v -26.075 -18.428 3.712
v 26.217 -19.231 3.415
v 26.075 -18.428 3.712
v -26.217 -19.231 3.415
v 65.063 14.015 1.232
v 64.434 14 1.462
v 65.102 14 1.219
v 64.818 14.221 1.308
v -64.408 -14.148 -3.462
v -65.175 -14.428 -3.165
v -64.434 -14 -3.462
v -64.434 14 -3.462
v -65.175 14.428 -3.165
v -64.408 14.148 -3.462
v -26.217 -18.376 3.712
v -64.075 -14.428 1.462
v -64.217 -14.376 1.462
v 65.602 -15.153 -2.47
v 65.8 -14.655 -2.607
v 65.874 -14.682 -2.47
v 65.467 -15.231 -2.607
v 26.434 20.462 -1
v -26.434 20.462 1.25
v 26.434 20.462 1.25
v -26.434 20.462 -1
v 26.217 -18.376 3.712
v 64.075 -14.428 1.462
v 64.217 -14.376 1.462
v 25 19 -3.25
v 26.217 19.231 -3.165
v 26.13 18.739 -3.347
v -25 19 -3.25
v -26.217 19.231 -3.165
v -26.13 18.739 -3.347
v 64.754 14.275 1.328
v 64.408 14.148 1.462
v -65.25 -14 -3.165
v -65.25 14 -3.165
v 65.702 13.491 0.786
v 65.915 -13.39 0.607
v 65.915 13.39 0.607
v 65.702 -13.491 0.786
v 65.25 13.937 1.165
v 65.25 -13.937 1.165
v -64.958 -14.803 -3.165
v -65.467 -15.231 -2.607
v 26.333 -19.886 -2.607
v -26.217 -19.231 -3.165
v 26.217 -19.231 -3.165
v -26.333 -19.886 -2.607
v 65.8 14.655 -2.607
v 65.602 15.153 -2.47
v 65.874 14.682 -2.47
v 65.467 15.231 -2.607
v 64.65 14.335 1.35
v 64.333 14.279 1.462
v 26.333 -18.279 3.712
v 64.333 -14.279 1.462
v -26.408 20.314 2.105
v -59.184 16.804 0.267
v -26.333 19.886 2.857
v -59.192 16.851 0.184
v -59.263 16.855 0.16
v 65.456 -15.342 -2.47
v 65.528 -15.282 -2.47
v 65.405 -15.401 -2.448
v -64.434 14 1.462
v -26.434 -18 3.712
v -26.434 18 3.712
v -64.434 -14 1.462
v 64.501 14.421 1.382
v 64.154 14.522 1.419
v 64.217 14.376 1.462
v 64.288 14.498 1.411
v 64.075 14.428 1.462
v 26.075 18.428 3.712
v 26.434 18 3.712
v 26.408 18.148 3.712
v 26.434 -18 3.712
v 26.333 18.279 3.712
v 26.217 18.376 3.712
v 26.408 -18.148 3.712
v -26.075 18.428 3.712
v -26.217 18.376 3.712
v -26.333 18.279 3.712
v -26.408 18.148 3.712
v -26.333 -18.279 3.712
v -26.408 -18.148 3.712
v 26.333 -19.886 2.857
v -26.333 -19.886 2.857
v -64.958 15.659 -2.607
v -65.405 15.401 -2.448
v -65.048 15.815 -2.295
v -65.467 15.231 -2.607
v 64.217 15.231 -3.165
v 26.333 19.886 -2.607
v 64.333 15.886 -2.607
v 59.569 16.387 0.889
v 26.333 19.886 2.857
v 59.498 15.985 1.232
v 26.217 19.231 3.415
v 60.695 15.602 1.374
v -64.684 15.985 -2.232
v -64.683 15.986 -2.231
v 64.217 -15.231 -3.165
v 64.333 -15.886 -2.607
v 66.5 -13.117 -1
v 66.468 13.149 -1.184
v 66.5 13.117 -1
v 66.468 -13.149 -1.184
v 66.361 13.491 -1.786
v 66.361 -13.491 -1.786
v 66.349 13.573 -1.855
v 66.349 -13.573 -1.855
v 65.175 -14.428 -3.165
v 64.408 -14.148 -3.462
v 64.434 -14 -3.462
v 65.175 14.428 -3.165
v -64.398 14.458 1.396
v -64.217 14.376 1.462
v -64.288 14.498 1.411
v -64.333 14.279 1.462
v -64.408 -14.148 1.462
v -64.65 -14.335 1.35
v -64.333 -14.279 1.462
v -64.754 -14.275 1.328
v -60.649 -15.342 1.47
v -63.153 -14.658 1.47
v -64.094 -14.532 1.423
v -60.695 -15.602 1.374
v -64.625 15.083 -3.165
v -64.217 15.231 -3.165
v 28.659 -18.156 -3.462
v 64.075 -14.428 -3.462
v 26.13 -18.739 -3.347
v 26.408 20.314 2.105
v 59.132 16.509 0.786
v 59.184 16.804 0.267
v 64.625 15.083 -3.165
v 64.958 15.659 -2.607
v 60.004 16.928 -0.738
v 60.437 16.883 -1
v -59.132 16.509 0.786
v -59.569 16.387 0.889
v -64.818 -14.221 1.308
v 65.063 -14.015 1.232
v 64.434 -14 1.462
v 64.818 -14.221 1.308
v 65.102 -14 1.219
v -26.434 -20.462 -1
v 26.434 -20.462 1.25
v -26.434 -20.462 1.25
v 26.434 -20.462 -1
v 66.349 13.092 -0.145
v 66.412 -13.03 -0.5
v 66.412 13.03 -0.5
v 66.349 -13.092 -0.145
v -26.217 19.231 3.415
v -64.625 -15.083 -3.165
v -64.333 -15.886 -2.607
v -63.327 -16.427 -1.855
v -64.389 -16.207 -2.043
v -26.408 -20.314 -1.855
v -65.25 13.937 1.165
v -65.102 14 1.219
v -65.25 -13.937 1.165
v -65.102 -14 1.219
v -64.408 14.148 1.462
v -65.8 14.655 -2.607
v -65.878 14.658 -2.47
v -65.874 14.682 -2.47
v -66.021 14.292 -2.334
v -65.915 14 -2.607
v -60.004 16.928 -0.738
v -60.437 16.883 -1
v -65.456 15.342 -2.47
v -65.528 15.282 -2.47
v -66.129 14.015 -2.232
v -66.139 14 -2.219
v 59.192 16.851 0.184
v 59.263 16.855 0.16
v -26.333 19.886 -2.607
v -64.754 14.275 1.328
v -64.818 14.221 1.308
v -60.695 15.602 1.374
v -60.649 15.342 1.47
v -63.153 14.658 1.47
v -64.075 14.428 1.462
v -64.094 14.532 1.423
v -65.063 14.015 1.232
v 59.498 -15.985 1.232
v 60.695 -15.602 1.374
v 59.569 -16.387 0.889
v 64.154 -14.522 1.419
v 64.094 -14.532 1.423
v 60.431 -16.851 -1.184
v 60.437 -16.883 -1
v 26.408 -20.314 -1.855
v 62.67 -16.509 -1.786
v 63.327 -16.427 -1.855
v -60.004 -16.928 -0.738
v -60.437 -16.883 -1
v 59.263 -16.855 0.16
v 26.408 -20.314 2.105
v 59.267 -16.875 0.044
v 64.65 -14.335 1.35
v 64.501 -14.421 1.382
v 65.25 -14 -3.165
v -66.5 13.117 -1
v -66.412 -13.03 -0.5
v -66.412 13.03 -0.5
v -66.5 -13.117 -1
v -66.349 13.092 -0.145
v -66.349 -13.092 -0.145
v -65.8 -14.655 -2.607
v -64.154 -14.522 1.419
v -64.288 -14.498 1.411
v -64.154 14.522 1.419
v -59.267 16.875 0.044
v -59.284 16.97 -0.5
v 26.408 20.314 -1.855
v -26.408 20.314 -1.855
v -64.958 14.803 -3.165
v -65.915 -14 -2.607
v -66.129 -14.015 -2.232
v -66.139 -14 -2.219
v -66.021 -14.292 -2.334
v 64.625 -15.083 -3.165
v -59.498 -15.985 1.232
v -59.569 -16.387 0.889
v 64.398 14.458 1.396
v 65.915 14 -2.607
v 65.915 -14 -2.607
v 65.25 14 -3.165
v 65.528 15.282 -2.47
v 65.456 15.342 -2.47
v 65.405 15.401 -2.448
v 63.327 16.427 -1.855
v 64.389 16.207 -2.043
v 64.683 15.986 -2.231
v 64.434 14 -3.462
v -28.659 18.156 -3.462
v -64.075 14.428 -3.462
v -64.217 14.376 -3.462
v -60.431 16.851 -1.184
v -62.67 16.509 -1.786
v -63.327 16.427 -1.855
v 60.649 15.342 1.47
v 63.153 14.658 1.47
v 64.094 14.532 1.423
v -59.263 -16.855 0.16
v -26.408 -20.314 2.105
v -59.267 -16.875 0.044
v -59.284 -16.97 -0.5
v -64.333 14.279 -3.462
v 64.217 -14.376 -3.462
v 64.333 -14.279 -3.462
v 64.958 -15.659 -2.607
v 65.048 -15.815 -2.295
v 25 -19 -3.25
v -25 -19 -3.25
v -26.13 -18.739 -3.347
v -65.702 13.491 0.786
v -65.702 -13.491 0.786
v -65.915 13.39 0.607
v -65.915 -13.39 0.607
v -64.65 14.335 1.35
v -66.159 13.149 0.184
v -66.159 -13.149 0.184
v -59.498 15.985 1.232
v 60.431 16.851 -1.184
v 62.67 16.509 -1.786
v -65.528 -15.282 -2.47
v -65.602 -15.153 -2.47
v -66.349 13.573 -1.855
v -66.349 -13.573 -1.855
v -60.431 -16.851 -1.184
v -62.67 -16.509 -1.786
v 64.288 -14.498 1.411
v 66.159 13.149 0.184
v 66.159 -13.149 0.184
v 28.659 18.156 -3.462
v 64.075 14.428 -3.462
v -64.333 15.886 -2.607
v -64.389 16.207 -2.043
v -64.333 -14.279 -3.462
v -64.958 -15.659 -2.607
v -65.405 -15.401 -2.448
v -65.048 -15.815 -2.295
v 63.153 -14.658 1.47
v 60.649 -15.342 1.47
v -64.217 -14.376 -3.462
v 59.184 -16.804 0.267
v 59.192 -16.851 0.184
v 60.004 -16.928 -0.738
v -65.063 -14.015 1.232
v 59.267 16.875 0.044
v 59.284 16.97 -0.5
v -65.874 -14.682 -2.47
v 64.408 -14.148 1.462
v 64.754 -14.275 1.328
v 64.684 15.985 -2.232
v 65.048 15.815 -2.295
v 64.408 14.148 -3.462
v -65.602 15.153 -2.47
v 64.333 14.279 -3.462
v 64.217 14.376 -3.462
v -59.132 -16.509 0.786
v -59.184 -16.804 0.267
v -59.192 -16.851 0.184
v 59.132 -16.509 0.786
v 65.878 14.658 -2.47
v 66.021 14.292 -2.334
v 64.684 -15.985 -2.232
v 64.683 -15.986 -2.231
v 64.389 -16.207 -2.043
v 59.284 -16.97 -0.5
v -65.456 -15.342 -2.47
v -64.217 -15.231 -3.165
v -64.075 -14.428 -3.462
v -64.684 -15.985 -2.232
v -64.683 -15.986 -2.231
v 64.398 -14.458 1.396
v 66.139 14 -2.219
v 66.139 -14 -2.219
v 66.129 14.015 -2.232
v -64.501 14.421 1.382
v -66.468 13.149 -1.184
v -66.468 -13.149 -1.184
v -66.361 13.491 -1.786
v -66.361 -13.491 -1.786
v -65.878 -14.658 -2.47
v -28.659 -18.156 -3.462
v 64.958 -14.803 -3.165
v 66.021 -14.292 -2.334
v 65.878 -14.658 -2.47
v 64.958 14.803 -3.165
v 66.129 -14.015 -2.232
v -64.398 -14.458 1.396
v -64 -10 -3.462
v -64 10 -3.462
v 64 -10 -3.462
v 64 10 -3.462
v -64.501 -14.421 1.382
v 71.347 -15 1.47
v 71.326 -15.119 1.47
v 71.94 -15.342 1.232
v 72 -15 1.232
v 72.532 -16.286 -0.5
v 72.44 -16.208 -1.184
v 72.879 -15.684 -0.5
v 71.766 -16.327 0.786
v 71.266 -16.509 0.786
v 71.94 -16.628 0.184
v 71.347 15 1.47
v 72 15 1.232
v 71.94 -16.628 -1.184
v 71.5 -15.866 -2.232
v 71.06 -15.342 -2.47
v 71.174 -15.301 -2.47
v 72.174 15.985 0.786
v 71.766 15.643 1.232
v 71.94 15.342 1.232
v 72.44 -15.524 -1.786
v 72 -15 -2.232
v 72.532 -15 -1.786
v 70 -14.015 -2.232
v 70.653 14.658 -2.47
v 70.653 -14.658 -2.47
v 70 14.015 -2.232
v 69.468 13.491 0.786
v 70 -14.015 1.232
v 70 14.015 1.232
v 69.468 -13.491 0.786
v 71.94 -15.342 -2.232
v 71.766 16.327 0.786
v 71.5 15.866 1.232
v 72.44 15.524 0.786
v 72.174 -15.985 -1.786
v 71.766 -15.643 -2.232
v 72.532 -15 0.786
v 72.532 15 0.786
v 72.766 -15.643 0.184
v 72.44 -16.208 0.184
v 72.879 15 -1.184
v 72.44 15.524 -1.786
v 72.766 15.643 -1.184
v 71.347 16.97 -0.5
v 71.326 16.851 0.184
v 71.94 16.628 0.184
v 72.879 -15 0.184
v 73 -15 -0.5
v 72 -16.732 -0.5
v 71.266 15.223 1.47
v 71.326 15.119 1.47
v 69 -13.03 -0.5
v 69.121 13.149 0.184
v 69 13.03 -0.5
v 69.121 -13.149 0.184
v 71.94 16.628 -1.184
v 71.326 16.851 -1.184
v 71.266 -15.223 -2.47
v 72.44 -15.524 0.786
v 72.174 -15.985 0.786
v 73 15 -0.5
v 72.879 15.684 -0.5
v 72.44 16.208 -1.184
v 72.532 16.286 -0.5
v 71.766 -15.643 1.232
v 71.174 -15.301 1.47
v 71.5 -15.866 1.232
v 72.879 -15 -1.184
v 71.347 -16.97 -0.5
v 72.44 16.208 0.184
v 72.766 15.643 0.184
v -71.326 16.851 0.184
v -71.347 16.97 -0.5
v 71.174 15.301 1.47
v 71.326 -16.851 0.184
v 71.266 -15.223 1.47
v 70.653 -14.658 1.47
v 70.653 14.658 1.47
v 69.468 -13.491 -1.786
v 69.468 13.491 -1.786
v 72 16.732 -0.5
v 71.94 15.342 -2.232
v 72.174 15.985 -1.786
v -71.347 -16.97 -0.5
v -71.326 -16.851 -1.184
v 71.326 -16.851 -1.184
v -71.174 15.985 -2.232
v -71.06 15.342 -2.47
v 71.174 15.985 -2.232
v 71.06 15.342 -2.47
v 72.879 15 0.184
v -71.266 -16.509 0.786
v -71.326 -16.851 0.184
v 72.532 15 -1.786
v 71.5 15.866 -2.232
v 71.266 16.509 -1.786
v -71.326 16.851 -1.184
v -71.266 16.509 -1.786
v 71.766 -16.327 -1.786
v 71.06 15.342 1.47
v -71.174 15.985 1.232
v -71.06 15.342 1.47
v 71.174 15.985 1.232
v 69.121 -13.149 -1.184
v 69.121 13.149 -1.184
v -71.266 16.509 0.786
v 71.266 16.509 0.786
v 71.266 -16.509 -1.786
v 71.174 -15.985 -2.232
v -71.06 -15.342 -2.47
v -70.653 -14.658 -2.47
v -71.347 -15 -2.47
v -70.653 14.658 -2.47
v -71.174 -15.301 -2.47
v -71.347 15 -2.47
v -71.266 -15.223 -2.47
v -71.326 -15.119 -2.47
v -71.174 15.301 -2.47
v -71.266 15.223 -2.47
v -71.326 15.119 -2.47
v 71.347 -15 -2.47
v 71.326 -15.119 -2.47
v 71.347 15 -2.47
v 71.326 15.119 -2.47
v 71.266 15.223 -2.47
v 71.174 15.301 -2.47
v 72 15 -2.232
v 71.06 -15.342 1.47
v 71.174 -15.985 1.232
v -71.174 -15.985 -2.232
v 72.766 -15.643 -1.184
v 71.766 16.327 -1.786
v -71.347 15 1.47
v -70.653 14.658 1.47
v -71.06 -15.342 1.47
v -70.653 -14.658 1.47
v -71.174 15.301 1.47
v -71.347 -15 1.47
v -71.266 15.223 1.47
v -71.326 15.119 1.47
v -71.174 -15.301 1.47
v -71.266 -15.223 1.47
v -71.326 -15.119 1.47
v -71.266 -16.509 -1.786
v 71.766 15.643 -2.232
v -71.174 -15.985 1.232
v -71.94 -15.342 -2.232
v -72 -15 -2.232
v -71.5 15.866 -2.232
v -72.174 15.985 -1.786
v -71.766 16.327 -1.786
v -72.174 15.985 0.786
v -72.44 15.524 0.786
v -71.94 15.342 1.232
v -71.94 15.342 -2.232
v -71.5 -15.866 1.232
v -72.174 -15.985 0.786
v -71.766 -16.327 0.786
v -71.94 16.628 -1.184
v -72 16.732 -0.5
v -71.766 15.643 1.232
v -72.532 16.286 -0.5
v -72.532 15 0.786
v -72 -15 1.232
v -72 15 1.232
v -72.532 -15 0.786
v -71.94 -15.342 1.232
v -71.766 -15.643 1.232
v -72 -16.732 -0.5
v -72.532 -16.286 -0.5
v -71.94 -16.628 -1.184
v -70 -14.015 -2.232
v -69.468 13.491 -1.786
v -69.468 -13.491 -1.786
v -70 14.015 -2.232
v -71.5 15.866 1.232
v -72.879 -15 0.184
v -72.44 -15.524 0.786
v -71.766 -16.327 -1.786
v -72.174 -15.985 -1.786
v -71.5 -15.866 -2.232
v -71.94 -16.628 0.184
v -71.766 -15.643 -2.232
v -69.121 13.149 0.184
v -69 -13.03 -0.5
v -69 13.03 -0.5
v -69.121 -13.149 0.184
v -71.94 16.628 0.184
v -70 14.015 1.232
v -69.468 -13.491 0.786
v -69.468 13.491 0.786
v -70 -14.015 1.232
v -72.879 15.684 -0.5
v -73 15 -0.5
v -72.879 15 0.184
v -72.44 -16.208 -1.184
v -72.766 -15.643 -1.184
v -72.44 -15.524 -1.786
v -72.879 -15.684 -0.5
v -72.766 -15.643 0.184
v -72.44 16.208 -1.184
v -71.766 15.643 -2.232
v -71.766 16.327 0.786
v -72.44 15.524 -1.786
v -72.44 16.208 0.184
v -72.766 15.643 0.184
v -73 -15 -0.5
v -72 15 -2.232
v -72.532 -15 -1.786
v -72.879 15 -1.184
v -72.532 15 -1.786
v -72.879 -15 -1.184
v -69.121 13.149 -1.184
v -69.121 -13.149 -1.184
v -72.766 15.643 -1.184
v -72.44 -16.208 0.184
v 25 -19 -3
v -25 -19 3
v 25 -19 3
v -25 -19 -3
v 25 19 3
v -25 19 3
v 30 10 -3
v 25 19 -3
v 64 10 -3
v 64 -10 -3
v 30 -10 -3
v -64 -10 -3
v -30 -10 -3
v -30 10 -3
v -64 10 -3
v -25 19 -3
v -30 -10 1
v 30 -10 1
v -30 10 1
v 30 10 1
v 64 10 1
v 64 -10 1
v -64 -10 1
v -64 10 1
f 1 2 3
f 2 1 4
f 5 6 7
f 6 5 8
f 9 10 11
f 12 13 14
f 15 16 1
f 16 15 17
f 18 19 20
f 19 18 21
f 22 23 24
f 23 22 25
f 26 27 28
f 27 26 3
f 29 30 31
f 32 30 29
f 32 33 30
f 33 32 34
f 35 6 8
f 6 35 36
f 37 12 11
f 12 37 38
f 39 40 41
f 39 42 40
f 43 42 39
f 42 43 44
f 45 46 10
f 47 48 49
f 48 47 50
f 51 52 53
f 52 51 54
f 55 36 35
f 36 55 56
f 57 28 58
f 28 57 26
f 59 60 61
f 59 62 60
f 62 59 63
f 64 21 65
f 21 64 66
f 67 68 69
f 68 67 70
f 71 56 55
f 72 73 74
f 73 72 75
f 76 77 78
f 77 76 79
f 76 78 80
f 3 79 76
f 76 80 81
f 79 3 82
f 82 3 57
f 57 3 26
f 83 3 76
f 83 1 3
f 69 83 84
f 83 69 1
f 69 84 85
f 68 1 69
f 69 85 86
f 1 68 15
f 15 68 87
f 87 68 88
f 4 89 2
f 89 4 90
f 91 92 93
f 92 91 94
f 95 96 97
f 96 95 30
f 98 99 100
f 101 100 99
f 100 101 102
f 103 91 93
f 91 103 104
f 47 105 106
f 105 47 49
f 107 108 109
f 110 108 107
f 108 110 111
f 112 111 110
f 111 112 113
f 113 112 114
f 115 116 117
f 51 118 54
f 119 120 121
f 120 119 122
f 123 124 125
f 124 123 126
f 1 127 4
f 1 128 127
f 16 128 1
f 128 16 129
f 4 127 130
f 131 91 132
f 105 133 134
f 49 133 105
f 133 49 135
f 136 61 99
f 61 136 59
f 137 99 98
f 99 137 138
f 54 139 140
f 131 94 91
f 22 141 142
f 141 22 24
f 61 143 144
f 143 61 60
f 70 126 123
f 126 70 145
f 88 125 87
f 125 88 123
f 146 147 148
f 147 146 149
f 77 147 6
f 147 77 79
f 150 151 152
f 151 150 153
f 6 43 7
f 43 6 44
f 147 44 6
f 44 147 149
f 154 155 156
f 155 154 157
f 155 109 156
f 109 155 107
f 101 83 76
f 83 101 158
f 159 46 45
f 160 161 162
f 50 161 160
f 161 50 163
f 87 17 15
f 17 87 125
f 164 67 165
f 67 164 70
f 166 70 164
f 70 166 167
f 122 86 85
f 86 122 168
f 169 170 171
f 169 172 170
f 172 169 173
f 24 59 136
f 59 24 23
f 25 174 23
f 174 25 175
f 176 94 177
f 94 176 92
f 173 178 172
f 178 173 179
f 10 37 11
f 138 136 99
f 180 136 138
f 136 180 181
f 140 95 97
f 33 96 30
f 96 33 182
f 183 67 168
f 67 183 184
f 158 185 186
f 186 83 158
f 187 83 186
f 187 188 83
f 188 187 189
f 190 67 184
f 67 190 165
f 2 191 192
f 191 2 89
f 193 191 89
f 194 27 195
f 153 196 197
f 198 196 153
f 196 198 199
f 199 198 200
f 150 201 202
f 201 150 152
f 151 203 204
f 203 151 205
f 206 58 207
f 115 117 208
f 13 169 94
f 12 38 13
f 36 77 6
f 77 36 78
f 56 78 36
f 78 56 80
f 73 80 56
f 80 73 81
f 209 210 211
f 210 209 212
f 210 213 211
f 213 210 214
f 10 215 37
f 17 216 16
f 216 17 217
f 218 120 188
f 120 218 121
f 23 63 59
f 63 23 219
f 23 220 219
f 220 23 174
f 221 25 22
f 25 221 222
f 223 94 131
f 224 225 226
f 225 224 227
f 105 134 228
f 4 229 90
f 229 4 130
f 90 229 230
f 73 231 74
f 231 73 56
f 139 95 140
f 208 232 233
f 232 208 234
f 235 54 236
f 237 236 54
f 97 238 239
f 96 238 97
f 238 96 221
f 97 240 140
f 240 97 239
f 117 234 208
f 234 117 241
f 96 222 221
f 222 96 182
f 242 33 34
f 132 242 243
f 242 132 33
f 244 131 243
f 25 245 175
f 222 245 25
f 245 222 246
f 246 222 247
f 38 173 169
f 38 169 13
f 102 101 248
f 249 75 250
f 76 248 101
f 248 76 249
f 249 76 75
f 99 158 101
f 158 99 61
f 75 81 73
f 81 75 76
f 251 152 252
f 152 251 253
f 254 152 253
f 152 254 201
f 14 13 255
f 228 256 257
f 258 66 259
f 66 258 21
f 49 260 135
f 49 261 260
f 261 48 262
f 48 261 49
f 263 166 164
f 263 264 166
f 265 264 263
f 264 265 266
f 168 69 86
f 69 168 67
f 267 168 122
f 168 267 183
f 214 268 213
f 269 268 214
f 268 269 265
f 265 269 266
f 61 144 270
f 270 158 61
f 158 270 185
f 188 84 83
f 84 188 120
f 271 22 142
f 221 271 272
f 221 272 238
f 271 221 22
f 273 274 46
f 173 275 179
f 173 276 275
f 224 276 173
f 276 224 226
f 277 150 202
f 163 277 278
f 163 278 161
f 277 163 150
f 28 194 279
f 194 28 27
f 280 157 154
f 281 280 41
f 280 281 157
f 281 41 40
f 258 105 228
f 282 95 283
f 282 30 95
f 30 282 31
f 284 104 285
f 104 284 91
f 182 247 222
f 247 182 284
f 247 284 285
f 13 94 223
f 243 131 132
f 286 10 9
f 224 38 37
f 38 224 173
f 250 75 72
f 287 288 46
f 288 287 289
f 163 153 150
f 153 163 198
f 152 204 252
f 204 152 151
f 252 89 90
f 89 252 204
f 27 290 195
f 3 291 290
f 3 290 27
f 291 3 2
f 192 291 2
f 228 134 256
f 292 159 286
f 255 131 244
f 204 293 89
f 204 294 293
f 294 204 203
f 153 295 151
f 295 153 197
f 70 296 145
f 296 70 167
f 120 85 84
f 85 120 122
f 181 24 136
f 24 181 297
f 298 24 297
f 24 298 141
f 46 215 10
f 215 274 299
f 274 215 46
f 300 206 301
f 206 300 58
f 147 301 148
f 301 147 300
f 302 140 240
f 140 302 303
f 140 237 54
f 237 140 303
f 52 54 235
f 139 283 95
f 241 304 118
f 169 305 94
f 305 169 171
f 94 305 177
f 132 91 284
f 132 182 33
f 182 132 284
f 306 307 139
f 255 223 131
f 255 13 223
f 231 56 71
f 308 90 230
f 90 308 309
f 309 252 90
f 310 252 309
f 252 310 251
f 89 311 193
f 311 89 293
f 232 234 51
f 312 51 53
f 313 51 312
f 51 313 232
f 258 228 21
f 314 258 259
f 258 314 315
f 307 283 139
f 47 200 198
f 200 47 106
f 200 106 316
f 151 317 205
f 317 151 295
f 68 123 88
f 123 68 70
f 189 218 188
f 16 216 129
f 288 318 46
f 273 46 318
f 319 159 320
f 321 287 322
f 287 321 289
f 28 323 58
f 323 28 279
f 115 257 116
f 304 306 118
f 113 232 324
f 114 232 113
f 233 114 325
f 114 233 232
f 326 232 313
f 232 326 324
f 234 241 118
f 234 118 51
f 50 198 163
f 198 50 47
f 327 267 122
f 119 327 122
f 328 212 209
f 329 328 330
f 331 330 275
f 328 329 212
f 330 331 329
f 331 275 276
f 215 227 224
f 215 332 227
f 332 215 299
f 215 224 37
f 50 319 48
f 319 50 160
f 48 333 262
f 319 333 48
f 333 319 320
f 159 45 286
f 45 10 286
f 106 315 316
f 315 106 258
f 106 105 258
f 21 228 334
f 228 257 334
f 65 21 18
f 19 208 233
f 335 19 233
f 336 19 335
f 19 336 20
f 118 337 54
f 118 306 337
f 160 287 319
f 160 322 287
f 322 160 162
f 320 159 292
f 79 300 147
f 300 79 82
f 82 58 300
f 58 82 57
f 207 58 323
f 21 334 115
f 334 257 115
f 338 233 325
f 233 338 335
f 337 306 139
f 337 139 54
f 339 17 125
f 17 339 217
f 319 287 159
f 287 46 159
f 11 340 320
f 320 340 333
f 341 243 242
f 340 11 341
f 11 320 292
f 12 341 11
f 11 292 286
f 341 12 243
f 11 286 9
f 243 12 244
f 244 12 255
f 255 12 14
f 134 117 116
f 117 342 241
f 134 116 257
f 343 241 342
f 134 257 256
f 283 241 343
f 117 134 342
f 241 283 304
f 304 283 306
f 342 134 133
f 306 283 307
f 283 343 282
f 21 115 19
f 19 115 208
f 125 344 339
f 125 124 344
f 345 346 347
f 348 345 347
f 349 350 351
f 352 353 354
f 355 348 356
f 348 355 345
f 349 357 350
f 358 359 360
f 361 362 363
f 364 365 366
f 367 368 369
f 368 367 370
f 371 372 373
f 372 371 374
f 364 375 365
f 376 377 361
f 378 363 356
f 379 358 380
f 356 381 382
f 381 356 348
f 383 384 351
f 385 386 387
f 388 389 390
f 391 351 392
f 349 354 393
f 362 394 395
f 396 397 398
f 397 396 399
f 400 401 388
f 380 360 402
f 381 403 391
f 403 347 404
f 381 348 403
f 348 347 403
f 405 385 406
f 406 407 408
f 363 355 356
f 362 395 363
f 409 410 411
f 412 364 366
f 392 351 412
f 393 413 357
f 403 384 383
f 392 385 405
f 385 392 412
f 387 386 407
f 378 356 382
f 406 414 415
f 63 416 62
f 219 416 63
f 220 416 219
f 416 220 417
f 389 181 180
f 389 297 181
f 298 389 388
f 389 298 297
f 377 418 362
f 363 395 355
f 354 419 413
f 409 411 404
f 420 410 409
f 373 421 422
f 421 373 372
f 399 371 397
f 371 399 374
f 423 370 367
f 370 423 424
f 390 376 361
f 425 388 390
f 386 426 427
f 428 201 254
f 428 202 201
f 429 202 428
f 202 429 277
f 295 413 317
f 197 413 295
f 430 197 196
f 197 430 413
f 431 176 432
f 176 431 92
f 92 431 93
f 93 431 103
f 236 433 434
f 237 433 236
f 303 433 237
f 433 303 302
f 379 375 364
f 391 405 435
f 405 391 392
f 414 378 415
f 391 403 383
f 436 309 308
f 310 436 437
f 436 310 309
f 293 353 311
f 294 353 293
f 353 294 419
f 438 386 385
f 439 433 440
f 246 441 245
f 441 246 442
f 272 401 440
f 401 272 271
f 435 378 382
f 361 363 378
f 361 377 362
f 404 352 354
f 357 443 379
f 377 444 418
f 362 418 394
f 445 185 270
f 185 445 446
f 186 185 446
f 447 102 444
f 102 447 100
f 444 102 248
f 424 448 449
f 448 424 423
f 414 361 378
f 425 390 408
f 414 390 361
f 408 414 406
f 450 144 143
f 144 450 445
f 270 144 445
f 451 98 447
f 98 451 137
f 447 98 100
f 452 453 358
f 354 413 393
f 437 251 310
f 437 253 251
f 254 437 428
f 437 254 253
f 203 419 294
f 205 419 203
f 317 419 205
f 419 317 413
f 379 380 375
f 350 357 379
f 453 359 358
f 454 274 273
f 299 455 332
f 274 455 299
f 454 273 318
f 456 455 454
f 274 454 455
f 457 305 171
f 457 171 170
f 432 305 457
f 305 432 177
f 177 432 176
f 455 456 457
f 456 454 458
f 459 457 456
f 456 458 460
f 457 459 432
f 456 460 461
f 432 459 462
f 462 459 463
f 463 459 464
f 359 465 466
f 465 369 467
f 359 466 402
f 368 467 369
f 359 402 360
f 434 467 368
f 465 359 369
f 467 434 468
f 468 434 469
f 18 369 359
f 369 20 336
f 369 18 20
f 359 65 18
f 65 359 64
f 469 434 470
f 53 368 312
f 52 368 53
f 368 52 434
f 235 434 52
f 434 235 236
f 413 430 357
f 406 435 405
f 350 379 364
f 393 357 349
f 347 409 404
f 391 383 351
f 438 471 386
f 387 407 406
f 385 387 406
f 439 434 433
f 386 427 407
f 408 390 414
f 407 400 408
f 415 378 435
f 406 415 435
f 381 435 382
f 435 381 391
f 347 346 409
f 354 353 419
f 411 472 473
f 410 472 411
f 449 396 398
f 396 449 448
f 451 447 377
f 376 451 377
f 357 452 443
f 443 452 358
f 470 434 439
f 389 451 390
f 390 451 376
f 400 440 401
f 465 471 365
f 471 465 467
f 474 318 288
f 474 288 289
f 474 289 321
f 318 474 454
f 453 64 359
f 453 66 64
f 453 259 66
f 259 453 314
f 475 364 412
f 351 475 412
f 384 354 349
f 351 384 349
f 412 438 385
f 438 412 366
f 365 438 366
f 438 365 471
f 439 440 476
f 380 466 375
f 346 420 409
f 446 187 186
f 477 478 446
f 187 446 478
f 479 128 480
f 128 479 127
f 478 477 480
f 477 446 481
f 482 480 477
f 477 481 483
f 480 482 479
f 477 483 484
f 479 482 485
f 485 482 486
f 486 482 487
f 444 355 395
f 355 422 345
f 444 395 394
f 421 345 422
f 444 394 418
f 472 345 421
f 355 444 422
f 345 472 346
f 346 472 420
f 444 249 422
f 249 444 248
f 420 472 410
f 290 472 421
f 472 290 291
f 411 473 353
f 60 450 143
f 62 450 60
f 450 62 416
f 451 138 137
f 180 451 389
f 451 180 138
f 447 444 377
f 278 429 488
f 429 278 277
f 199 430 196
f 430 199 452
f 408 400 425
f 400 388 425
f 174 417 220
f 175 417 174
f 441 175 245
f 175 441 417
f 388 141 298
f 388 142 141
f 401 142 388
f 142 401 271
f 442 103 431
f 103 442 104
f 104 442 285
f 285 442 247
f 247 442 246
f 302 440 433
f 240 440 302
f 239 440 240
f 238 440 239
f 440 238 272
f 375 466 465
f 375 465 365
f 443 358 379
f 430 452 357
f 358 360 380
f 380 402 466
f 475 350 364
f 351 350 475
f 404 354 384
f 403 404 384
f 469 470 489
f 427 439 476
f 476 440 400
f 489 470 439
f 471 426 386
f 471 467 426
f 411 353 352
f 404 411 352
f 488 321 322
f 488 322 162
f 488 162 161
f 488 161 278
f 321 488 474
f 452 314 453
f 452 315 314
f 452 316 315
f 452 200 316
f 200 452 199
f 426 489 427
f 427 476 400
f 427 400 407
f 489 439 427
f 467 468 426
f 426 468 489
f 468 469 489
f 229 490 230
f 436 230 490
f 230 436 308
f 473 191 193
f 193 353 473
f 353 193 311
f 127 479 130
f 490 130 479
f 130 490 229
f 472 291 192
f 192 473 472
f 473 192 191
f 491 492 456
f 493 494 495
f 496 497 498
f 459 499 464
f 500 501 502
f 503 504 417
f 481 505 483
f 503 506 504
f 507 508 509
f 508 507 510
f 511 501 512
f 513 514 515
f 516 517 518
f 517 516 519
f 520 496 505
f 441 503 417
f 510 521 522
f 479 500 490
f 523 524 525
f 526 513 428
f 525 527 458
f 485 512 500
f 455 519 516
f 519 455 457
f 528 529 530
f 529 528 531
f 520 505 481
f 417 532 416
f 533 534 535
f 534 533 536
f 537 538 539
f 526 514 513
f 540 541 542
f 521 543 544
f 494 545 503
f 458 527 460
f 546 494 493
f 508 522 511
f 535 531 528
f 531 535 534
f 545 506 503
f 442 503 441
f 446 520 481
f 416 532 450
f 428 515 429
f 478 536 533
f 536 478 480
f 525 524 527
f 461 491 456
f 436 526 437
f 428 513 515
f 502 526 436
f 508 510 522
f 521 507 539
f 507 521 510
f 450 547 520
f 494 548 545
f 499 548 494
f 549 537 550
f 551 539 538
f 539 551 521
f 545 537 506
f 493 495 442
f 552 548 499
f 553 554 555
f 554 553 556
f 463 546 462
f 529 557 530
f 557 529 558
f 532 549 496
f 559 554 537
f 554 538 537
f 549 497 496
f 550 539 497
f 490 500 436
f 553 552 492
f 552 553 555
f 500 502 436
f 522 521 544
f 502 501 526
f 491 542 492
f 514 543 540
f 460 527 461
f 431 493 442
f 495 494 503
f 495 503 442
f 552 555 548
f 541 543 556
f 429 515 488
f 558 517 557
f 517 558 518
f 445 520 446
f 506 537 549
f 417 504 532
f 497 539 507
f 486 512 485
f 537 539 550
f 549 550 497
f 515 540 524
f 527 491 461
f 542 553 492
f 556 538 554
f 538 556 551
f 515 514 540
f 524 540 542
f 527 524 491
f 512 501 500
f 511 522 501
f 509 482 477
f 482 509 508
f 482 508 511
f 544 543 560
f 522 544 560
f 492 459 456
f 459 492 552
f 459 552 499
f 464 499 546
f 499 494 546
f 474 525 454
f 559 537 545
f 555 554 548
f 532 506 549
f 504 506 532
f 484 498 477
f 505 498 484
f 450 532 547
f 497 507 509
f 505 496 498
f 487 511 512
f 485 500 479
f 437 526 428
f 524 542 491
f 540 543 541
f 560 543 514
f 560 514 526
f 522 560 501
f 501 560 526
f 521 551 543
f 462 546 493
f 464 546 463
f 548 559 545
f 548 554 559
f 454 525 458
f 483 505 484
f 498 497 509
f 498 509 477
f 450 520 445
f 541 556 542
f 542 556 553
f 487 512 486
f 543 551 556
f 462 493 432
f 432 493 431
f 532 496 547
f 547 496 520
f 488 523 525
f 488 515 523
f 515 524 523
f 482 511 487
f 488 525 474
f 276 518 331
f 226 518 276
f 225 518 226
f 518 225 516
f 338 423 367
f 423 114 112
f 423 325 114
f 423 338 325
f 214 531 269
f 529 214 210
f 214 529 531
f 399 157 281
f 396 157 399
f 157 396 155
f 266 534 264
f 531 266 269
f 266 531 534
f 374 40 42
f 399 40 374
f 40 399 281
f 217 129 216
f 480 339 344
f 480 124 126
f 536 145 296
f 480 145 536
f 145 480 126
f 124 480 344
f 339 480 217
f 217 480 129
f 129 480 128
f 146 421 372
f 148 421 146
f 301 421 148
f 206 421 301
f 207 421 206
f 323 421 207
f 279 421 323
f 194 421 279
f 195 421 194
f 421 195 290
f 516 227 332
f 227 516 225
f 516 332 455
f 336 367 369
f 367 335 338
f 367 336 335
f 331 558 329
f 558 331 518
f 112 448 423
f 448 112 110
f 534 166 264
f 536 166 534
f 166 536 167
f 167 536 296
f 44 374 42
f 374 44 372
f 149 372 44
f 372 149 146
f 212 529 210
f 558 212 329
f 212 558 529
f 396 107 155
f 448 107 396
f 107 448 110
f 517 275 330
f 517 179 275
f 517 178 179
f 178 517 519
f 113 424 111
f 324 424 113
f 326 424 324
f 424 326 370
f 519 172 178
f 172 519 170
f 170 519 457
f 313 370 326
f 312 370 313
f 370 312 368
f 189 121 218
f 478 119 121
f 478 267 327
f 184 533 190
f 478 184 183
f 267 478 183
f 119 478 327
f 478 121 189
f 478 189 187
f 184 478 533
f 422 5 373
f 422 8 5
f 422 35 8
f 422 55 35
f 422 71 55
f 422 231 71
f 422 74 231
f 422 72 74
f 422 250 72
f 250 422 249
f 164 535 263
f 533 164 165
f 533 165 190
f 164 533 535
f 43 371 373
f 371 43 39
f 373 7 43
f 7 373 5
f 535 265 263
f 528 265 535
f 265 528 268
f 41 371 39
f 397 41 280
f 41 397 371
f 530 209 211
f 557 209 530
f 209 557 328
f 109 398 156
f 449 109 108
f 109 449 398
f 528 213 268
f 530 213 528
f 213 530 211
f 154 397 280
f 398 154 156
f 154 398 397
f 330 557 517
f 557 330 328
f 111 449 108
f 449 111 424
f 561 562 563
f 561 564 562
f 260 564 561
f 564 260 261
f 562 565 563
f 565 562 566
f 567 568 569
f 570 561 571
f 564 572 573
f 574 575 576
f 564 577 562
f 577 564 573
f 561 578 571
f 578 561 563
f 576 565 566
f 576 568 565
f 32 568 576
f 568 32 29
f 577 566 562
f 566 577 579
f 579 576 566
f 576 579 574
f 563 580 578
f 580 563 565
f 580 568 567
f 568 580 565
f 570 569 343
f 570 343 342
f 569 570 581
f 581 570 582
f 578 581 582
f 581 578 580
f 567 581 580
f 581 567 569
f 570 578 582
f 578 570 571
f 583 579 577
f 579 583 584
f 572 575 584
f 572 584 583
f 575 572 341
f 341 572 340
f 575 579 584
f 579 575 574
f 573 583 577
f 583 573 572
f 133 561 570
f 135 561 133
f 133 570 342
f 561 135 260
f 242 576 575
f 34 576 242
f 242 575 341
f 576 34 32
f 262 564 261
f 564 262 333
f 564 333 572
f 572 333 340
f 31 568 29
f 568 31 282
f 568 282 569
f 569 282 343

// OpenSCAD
// Nano: 47*20*8

// Micro 42*18*5 with connector sideways
// Gyro 20*16*5
// Charger 21*20*5
// Batterie 50*38*7
// Switch On/off
// Poti Intensity
// Poti Angle

//linear_extrude(height = 100, center = true, convexity = 10)
//import("/Users/jan/Desktop/Logo PP_text.dxf");

resolution= 18;

// Vibration motor 7mm Durchmesser, 25 lang, Standard, oder Pancake motor...

// Gurtband 25mm

//hull() {
//    
//}

//translate([15+7.5,10,0]) cube([30,18,6], center=true); // Nano
//translate([16/2,-9,0]) cube([16,20,6], center=true); // Gyro
//translate([16+11,-9,0]) cube([21,20,6], center=true); // Charger
//translate([-25-0.5,0,0]) cube([50,38,6], center=true); // Battery

//translate([-50-100-1,0,0]) cube([200,25,1], center=true); // Bellyband
//translate([+40+100-2,0,0]) cube([200,25,1], center=true); // Bellyband



//translate([25+19.5,0,-1]) cube([39,20,4], center=true); // Nano + Button
//translate([-25-19.5,0,-1]) cube([39,20,4], center=true); // Gyro + Charger
//translate([0,0,0]) cube([50,38,6], center=true); // Battery

//translate([-63-100-1,0,-2.5]) cube([200,25,1], center=true); // Bellyband
//translate([+63+100-2,0,-2.5]) cube([200,25,1], center=true); // Bellyband

difference() {
    outside();
    inside();
    translate([00,00,-4]) bottom();
}

//intersection() {
//    outside();    
//    difference() {
//        translate([00,00,-4]) bottom();
//        inside();
//    }
//}

module outside() {//missing opening usb, screws
    hull() {
    translate([64,14,-1]) sphere(d=5, center=true, $fn=resolution);
    translate([64,-14,-1]) sphere(d=5, center=true, $fn=resolution);
    translate([-64,14,-1]) sphere(d=5, center=true, $fn=resolution);
    translate([-64,-14,-1]) sphere(d=5, center=true, $fn=resolution);
    
    translate([26,18,-1]) sphere(d=5, center=true, $fn=resolution);
    translate([26,-18,-1]) sphere(d=5, center=true, $fn=resolution);
    translate([-26,18,-1]) sphere(d=5, center=true, $fn=resolution);
    translate([-26,-18,-1]) sphere(d=5, center=true, $fn=resolution);
    
    translate([26,18,1.25]) sphere(d=5, center=true, $fn=resolution);
    translate([26,-18,1.25]) sphere(d=5, center=true, $fn=resolution);
    translate([-26,18,1.25]) sphere(d=5, center=true, $fn=resolution);
    translate([-26,-18,1.25]) sphere(d=5, center=true, $fn=resolution);  
}
hull() {
    translate([71,15,-0.5]) sphere(d=4, center=true, $fn=resolution);
    translate([71,-15,-0.5]) sphere(d=4, center=true, $fn=resolution); 
}
hull() {
    translate([-71,15,-0.5]) sphere(d=4, center=true, $fn=resolution);
    translate([-71,-15,-0.5]) sphere(d=4, center=true, $fn=resolution); 
}
hull() {
    translate([71,-15,-0.5]) sphere(d=4, center=true, $fn=resolution);
    translate([-71,-15,-0.5]) sphere(d=4, center=true, $fn=resolution); 
}
hull() {
    translate([71,15,-0.5]) sphere(d=4, center=true, $fn=resolution);
    translate([-71,15,-0.5]) sphere(d=4, center=true, $fn=resolution); 
}
}

module inside() {
    hull() {
translate([25+19.5-15,0,-1]) cube([1,20,4], center=true); // Nano + Button
translate([-25-19.5+15,0,-1]) cube([1,20,4], center=true); // Gyro + Charger
translate([0,0,0]) cube([50,38,6], center=true); // Battery
    }
translate([25+19.5,0,-1]) cube([39,20,4], center=true); // Nano + Button
translate([-25-19.5,0,-1]) cube([39,20,4], center=true); // Gyro + Charger
}

module bottom() {
    hull() {
translate([25+19.5,0,0]) cube([39,20,2], center=true); // Nano + Button
translate([-25-19.5,0,0]) cube([39,20,2], center=true); // Gyro + Charger
translate([0,0,0]) cube([50,38,2], center=true); // Battery
    }
translate([25+19.5,0,0]) cube([39,20,2], center=true); // Nano + Button
translate([-25-19.5,0,0]) cube([39,20,2], center=true); // Gyro + Charger
}
